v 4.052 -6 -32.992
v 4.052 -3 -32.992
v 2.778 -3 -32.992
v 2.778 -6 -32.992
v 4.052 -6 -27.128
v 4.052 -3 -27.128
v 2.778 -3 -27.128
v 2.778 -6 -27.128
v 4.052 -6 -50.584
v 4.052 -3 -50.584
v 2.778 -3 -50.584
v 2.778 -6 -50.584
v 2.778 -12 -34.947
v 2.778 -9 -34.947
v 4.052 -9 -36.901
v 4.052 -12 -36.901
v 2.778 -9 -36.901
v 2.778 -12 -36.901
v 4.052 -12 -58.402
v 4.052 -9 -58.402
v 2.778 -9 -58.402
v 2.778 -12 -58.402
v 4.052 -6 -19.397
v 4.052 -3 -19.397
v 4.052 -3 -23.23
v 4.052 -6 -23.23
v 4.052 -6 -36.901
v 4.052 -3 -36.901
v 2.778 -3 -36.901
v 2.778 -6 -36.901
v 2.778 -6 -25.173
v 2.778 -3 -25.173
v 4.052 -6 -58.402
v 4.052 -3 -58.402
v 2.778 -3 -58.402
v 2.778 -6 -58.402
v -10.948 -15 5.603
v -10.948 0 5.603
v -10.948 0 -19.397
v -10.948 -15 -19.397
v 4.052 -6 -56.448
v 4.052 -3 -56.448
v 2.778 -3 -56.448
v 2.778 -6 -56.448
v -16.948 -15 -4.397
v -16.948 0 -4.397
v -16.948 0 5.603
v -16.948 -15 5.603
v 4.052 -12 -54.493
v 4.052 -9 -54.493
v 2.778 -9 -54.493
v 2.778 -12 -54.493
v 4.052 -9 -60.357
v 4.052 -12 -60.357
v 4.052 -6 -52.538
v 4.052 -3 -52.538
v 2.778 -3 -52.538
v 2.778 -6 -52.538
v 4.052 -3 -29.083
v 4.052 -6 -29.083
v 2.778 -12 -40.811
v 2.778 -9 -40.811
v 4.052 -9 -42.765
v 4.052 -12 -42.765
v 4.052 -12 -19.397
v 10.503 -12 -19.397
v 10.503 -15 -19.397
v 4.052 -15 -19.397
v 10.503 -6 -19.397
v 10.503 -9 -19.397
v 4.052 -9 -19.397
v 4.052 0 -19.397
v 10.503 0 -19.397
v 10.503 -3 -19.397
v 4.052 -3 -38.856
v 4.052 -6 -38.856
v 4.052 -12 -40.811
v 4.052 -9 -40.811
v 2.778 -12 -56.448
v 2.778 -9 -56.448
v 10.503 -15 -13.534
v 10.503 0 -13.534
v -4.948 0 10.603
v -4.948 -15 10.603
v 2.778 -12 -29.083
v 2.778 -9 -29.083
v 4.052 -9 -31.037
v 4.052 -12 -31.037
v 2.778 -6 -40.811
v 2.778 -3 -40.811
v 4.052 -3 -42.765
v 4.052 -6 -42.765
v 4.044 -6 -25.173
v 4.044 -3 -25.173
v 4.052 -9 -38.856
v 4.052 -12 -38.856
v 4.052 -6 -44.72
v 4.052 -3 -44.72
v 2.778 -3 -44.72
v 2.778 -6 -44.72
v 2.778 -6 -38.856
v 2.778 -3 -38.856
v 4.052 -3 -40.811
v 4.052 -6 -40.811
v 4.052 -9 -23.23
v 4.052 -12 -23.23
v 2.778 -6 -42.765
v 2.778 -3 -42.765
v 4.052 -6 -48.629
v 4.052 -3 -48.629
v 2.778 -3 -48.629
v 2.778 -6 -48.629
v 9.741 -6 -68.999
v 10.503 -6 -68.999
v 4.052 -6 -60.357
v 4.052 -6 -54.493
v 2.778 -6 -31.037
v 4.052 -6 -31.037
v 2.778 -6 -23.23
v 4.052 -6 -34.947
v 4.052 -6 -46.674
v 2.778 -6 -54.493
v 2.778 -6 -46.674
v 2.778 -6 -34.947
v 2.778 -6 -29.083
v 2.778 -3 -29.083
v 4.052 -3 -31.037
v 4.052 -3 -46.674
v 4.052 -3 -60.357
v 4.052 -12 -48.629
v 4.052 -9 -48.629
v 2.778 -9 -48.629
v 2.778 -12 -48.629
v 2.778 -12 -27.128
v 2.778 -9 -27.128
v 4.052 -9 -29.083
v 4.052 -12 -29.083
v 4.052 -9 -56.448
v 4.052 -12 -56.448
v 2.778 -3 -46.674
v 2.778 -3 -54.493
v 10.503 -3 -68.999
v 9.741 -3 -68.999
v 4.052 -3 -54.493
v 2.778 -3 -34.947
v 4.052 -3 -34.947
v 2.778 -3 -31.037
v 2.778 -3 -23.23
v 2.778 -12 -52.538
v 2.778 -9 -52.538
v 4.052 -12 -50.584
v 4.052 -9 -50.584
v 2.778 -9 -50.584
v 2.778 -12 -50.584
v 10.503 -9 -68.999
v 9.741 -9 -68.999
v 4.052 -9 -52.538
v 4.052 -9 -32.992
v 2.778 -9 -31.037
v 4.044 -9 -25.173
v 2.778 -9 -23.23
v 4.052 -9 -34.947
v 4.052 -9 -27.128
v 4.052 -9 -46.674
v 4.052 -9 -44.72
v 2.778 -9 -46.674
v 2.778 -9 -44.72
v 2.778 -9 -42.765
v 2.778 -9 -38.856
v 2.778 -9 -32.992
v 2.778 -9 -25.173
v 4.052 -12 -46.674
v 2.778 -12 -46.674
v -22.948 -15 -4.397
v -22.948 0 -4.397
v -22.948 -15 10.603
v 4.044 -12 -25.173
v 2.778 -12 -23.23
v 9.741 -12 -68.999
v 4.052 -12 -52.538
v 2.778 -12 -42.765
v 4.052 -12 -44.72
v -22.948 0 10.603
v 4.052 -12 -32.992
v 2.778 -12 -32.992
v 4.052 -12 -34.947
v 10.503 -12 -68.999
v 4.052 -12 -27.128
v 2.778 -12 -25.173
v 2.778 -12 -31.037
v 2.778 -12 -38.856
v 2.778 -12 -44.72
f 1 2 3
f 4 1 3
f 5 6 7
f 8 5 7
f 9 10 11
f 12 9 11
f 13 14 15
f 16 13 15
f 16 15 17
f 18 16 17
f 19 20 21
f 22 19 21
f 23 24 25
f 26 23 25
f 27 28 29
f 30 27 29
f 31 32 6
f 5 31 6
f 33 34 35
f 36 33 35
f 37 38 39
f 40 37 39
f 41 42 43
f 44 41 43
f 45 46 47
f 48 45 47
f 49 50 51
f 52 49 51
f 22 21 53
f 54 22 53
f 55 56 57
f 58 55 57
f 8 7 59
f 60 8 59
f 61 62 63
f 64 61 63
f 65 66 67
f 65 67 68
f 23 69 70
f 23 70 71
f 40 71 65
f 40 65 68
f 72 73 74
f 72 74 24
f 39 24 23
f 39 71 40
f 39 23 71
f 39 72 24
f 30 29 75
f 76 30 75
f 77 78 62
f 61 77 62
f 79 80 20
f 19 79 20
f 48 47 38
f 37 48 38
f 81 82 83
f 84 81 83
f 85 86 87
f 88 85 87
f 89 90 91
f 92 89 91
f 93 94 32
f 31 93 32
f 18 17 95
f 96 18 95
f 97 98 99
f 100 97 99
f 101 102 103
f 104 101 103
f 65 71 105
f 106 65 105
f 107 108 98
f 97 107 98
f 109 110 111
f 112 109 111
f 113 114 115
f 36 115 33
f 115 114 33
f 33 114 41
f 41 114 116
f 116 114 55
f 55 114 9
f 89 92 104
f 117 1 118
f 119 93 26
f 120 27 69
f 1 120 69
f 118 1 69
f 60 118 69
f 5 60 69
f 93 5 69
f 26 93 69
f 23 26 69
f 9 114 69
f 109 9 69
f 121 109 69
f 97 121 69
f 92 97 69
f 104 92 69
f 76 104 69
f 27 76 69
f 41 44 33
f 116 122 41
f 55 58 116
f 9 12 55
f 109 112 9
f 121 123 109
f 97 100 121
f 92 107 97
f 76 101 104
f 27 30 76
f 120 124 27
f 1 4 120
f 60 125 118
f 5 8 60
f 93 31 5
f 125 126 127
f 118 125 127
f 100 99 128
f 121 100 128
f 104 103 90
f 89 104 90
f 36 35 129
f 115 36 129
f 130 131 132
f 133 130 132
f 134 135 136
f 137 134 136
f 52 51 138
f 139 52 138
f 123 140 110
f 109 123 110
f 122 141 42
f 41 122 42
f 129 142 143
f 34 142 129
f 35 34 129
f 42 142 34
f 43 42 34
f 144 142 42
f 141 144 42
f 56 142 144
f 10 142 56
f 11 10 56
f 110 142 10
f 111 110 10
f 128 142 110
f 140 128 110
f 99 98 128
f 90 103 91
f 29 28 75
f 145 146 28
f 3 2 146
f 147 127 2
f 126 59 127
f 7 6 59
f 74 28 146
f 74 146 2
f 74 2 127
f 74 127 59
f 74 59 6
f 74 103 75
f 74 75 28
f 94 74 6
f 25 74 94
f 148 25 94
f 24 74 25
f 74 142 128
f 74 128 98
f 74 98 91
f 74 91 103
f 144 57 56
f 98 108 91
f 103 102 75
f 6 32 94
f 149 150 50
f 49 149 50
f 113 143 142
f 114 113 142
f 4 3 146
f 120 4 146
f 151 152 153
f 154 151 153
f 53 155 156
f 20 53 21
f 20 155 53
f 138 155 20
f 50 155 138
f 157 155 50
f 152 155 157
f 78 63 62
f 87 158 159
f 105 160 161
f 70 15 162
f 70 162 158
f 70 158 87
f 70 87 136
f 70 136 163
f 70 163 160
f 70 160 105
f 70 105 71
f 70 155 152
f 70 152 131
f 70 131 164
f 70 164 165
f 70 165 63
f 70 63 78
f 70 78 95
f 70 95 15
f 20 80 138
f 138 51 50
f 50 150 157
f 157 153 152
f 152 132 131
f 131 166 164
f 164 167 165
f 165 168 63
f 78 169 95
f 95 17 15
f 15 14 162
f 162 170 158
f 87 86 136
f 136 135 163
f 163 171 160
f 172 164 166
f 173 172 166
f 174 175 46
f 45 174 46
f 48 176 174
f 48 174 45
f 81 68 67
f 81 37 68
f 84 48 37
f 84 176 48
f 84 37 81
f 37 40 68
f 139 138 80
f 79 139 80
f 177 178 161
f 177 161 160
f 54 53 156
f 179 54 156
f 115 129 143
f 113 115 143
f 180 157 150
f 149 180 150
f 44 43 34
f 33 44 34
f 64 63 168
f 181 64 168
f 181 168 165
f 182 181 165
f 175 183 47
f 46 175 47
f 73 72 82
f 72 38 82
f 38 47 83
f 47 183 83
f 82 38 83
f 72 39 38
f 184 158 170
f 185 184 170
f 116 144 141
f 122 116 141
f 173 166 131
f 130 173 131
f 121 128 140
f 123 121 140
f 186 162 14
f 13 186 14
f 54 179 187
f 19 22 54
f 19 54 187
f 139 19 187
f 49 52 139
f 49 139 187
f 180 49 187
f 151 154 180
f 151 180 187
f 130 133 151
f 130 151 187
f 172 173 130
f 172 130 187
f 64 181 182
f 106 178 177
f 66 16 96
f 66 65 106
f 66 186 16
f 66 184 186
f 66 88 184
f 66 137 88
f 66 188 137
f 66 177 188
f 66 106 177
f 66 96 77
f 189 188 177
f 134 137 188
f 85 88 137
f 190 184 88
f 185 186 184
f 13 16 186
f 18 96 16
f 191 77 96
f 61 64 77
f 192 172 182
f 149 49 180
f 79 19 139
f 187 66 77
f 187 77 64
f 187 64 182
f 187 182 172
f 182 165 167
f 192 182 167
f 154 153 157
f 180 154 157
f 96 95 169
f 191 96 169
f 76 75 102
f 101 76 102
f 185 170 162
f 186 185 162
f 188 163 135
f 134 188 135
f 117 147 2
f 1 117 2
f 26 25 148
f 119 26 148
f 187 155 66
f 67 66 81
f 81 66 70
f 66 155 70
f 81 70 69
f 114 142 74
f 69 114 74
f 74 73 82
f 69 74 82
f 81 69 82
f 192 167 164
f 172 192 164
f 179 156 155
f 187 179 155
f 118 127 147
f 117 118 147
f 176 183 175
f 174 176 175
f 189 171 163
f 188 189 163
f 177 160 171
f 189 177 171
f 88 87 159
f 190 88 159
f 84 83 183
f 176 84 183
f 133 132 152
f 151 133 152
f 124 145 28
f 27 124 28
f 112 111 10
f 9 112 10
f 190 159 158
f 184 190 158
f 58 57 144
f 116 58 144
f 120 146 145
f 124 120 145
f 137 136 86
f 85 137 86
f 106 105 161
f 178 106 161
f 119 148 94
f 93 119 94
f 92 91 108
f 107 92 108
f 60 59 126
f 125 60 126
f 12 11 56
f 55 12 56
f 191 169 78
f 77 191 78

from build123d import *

# Parameters (mm, degrees)
F0_W     = 6
F0_H     = 5
F1_DEPTH = 15
F2_W     = 10.5033244736
F2_H     = 51.3265209893
F3_DEPTH = 3
F4_W     = 10.5033244736
F4_H     = 52.3007216553
F5_DEPTH = 3
F6_W     = 3
F6_H     = 49.6023270358
F7_DEPTH = 25.4


with BuildPart() as f1:
    # F0 (on Front) → F1 (new body)
    with BuildSketch(Plane.XZ):
        Polygon((-22.9482755264, 10.603449295), (-22.9482755264, -4.396550705), (-16.9482755264, -4.396550705), (-16.9482755264, 5.603449295), (-16.9482755264, 10.603449295), align=None)
        Polygon((4.0517244736, -29.082685709), (4.0517244736, -27.1280445158), (2.7775244736, -27.1280445158), align=None)
        Polygon((4.0517244736, -31.0373269022), (4.0517244736, -29.082685709), (2.7775244736, -29.082685709), align=None)
        Polygon((4.0517244736, -32.9919680953), (4.0517244736, -31.0373269022), (2.7775244736, -31.0373269022), align=None)
        Polygon((4.0517244736, -34.9466092885), (4.0517244736, -32.9919680953), (2.7775244736, -32.9919680953), align=None)
        Polygon((4.0517244736, -36.9012504816), (4.0517244736, -34.9466092885), (2.7775244736, -34.9466092885), align=None)
        Polygon((4.0517244736, -38.8558916748), (4.0517244736, -36.9012504816), (2.7775244736, -36.9012504816), align=None)
        Polygon((4.0517244736, -40.8105328679), (4.0517244736, -38.8558916748), (2.7775244736, -38.8558916748), align=None)
        Polygon((4.0517244736, -42.7651740611), (4.0517244736, -40.8105328679), (2.7775244736, -40.8105328679), align=None)
        Polygon((2.7775244736, -42.7651740611), (4.0517244736, -44.7198152542), (4.0517244736, -42.7651740611), align=None)
        Polygon((2.7775244736, -44.7198152542), (4.0517244736, -46.6744564474), (4.0517244736, -44.7198152542), align=None)
        Polygon((2.7775244736, -46.6744564474), (4.0517244736, -48.6290976405), (4.0517244736, -46.6744564474), align=None)
        Polygon((2.7775244736, -48.6290976405), (4.0517244736, -50.5837388337), (4.0517244736, -48.6290976405), align=None)
        Polygon((2.7775244736, -50.5837388337), (4.0517244736, -52.5383800268), (4.0517244736, -50.5837388337), align=None)
        Polygon((2.7775244736, -52.5383800268), (4.0517244736, -54.49302122), (4.0517244736, -52.5383800268), align=None)
        Polygon((2.7775244736, -54.49302122), (4.0517244736, -56.4476624131), (4.0517244736, -54.49302122), align=None)
        Polygon((2.7775244736, -56.4476624131), (4.0517244736, -58.4023036063), (4.0517244736, -56.4476624131), align=None)
        Polygon((2.7775244736, -58.4023036063), (4.0517244736, -60.3569447994), (4.0517244736, -58.4023036063), align=None)
        with Locations((-13.9482755264, 8.103449295)):
            Rectangle(F0_W, F0_H)
        Polygon((10.5033244736, -13.5344793896), (-4.9482755264, 10.603449295), (-4.9482755264, -13.5344793896), align=None)
        Polygon((4.0517244736, -25.1734033227), (4.0517244736, -23.2300292701), (2.7775244736, -23.2300292701), (4.0443796011, -25.1734033227), align=None)
        Polygon((4.0517244736, -27.1280445158), (4.0517244736, -25.1846704632), (4.0443796011, -25.1734033227), (2.7775244736, -25.1734033227), align=None)
        Polygon((-10.9482755264, 10.603449295), (-10.9482755264, 5.603449295), (-10.9482755264, -19.396550705), (-4.9482755264, -19.396550705), (-4.9482755264, -13.5344793896), (-4.9482755264, 10.603449295), align=None)
        Polygon((-4.9482755264, -13.5344793896), (-4.9482755264, -19.396550705), (4.0517244736, -19.396550705), (10.5033244736, -19.396550705), (10.5033244736, -13.5344793896), align=None)
        Polygon((4.0517244736, -25.1846704632), (4.0517244736, -25.1734033227), (4.0443796011, -25.1734033227), align=None)
        Polygon((10.5033244736, -19.396550705), (4.0517244736, -19.396550705), (4.0517244736, -23.2300292701), (4.0517244736, -25.1734033227), (4.0517244736, -25.1846704632), (4.0517244736, -27.1280445158), (4.0517244736, -29.082685709), (4.0517244736, -31.0373269022), (4.0517244736, -32.9919680953), (4.0517244736, -34.9466092885), (4.0517244736, -36.9012504816), (4.0517244736, -38.8558916748), (4.0517244736, -40.8105328679), (4.0517244736, -42.7651740611), (4.0517244736, -44.7198152542), (4.0517244736, -46.6744564474), (4.0517244736, -48.6290976405), (4.0517244736, -50.5837388337), (4.0517244736, -52.5383800268), (4.0517244736, -54.49302122), (4.0517244736, -56.4476624131), (4.0517244736, -58.4023036063), (4.0517244736, -60.3569447994), (9.7408400844, -68.9988777408), (10.5033244736, -68.9988777408), align=None)
    extrude(amount=F1_DEPTH)

    # F2 (on face) → F3 (cut)
    with BuildSketch(Plane(origin=(0, 0, 0), x_dir=(-1, 0, 0), z_dir=(0, 1, 0))):
        with Locations((-5.2516622368, -45.0598111997)):
            Rectangle(F2_W, F2_H)
    extrude(amount=-F3_DEPTH, mode=Mode.SUBTRACT)

    # F4 (on face) → F5 (cut)
    with BuildSketch(Plane.XZ.offset(15)):
        with Locations((5.2516622368, -45.5469115327)):
            Rectangle(F4_W, F4_H)
    extrude(amount=-F5_DEPTH, mode=Mode.SUBTRACT)

    # F6 (on face) → F7 (cut)
    with BuildSketch(Plane.YZ.offset(10.5033244736)):
        with Locations((-7.5, -44.1977142229)):
            Rectangle(F6_W, F6_H)
    extrude(amount=-F7_DEPTH, mode=Mode.SUBTRACT)


solid = f1.part
